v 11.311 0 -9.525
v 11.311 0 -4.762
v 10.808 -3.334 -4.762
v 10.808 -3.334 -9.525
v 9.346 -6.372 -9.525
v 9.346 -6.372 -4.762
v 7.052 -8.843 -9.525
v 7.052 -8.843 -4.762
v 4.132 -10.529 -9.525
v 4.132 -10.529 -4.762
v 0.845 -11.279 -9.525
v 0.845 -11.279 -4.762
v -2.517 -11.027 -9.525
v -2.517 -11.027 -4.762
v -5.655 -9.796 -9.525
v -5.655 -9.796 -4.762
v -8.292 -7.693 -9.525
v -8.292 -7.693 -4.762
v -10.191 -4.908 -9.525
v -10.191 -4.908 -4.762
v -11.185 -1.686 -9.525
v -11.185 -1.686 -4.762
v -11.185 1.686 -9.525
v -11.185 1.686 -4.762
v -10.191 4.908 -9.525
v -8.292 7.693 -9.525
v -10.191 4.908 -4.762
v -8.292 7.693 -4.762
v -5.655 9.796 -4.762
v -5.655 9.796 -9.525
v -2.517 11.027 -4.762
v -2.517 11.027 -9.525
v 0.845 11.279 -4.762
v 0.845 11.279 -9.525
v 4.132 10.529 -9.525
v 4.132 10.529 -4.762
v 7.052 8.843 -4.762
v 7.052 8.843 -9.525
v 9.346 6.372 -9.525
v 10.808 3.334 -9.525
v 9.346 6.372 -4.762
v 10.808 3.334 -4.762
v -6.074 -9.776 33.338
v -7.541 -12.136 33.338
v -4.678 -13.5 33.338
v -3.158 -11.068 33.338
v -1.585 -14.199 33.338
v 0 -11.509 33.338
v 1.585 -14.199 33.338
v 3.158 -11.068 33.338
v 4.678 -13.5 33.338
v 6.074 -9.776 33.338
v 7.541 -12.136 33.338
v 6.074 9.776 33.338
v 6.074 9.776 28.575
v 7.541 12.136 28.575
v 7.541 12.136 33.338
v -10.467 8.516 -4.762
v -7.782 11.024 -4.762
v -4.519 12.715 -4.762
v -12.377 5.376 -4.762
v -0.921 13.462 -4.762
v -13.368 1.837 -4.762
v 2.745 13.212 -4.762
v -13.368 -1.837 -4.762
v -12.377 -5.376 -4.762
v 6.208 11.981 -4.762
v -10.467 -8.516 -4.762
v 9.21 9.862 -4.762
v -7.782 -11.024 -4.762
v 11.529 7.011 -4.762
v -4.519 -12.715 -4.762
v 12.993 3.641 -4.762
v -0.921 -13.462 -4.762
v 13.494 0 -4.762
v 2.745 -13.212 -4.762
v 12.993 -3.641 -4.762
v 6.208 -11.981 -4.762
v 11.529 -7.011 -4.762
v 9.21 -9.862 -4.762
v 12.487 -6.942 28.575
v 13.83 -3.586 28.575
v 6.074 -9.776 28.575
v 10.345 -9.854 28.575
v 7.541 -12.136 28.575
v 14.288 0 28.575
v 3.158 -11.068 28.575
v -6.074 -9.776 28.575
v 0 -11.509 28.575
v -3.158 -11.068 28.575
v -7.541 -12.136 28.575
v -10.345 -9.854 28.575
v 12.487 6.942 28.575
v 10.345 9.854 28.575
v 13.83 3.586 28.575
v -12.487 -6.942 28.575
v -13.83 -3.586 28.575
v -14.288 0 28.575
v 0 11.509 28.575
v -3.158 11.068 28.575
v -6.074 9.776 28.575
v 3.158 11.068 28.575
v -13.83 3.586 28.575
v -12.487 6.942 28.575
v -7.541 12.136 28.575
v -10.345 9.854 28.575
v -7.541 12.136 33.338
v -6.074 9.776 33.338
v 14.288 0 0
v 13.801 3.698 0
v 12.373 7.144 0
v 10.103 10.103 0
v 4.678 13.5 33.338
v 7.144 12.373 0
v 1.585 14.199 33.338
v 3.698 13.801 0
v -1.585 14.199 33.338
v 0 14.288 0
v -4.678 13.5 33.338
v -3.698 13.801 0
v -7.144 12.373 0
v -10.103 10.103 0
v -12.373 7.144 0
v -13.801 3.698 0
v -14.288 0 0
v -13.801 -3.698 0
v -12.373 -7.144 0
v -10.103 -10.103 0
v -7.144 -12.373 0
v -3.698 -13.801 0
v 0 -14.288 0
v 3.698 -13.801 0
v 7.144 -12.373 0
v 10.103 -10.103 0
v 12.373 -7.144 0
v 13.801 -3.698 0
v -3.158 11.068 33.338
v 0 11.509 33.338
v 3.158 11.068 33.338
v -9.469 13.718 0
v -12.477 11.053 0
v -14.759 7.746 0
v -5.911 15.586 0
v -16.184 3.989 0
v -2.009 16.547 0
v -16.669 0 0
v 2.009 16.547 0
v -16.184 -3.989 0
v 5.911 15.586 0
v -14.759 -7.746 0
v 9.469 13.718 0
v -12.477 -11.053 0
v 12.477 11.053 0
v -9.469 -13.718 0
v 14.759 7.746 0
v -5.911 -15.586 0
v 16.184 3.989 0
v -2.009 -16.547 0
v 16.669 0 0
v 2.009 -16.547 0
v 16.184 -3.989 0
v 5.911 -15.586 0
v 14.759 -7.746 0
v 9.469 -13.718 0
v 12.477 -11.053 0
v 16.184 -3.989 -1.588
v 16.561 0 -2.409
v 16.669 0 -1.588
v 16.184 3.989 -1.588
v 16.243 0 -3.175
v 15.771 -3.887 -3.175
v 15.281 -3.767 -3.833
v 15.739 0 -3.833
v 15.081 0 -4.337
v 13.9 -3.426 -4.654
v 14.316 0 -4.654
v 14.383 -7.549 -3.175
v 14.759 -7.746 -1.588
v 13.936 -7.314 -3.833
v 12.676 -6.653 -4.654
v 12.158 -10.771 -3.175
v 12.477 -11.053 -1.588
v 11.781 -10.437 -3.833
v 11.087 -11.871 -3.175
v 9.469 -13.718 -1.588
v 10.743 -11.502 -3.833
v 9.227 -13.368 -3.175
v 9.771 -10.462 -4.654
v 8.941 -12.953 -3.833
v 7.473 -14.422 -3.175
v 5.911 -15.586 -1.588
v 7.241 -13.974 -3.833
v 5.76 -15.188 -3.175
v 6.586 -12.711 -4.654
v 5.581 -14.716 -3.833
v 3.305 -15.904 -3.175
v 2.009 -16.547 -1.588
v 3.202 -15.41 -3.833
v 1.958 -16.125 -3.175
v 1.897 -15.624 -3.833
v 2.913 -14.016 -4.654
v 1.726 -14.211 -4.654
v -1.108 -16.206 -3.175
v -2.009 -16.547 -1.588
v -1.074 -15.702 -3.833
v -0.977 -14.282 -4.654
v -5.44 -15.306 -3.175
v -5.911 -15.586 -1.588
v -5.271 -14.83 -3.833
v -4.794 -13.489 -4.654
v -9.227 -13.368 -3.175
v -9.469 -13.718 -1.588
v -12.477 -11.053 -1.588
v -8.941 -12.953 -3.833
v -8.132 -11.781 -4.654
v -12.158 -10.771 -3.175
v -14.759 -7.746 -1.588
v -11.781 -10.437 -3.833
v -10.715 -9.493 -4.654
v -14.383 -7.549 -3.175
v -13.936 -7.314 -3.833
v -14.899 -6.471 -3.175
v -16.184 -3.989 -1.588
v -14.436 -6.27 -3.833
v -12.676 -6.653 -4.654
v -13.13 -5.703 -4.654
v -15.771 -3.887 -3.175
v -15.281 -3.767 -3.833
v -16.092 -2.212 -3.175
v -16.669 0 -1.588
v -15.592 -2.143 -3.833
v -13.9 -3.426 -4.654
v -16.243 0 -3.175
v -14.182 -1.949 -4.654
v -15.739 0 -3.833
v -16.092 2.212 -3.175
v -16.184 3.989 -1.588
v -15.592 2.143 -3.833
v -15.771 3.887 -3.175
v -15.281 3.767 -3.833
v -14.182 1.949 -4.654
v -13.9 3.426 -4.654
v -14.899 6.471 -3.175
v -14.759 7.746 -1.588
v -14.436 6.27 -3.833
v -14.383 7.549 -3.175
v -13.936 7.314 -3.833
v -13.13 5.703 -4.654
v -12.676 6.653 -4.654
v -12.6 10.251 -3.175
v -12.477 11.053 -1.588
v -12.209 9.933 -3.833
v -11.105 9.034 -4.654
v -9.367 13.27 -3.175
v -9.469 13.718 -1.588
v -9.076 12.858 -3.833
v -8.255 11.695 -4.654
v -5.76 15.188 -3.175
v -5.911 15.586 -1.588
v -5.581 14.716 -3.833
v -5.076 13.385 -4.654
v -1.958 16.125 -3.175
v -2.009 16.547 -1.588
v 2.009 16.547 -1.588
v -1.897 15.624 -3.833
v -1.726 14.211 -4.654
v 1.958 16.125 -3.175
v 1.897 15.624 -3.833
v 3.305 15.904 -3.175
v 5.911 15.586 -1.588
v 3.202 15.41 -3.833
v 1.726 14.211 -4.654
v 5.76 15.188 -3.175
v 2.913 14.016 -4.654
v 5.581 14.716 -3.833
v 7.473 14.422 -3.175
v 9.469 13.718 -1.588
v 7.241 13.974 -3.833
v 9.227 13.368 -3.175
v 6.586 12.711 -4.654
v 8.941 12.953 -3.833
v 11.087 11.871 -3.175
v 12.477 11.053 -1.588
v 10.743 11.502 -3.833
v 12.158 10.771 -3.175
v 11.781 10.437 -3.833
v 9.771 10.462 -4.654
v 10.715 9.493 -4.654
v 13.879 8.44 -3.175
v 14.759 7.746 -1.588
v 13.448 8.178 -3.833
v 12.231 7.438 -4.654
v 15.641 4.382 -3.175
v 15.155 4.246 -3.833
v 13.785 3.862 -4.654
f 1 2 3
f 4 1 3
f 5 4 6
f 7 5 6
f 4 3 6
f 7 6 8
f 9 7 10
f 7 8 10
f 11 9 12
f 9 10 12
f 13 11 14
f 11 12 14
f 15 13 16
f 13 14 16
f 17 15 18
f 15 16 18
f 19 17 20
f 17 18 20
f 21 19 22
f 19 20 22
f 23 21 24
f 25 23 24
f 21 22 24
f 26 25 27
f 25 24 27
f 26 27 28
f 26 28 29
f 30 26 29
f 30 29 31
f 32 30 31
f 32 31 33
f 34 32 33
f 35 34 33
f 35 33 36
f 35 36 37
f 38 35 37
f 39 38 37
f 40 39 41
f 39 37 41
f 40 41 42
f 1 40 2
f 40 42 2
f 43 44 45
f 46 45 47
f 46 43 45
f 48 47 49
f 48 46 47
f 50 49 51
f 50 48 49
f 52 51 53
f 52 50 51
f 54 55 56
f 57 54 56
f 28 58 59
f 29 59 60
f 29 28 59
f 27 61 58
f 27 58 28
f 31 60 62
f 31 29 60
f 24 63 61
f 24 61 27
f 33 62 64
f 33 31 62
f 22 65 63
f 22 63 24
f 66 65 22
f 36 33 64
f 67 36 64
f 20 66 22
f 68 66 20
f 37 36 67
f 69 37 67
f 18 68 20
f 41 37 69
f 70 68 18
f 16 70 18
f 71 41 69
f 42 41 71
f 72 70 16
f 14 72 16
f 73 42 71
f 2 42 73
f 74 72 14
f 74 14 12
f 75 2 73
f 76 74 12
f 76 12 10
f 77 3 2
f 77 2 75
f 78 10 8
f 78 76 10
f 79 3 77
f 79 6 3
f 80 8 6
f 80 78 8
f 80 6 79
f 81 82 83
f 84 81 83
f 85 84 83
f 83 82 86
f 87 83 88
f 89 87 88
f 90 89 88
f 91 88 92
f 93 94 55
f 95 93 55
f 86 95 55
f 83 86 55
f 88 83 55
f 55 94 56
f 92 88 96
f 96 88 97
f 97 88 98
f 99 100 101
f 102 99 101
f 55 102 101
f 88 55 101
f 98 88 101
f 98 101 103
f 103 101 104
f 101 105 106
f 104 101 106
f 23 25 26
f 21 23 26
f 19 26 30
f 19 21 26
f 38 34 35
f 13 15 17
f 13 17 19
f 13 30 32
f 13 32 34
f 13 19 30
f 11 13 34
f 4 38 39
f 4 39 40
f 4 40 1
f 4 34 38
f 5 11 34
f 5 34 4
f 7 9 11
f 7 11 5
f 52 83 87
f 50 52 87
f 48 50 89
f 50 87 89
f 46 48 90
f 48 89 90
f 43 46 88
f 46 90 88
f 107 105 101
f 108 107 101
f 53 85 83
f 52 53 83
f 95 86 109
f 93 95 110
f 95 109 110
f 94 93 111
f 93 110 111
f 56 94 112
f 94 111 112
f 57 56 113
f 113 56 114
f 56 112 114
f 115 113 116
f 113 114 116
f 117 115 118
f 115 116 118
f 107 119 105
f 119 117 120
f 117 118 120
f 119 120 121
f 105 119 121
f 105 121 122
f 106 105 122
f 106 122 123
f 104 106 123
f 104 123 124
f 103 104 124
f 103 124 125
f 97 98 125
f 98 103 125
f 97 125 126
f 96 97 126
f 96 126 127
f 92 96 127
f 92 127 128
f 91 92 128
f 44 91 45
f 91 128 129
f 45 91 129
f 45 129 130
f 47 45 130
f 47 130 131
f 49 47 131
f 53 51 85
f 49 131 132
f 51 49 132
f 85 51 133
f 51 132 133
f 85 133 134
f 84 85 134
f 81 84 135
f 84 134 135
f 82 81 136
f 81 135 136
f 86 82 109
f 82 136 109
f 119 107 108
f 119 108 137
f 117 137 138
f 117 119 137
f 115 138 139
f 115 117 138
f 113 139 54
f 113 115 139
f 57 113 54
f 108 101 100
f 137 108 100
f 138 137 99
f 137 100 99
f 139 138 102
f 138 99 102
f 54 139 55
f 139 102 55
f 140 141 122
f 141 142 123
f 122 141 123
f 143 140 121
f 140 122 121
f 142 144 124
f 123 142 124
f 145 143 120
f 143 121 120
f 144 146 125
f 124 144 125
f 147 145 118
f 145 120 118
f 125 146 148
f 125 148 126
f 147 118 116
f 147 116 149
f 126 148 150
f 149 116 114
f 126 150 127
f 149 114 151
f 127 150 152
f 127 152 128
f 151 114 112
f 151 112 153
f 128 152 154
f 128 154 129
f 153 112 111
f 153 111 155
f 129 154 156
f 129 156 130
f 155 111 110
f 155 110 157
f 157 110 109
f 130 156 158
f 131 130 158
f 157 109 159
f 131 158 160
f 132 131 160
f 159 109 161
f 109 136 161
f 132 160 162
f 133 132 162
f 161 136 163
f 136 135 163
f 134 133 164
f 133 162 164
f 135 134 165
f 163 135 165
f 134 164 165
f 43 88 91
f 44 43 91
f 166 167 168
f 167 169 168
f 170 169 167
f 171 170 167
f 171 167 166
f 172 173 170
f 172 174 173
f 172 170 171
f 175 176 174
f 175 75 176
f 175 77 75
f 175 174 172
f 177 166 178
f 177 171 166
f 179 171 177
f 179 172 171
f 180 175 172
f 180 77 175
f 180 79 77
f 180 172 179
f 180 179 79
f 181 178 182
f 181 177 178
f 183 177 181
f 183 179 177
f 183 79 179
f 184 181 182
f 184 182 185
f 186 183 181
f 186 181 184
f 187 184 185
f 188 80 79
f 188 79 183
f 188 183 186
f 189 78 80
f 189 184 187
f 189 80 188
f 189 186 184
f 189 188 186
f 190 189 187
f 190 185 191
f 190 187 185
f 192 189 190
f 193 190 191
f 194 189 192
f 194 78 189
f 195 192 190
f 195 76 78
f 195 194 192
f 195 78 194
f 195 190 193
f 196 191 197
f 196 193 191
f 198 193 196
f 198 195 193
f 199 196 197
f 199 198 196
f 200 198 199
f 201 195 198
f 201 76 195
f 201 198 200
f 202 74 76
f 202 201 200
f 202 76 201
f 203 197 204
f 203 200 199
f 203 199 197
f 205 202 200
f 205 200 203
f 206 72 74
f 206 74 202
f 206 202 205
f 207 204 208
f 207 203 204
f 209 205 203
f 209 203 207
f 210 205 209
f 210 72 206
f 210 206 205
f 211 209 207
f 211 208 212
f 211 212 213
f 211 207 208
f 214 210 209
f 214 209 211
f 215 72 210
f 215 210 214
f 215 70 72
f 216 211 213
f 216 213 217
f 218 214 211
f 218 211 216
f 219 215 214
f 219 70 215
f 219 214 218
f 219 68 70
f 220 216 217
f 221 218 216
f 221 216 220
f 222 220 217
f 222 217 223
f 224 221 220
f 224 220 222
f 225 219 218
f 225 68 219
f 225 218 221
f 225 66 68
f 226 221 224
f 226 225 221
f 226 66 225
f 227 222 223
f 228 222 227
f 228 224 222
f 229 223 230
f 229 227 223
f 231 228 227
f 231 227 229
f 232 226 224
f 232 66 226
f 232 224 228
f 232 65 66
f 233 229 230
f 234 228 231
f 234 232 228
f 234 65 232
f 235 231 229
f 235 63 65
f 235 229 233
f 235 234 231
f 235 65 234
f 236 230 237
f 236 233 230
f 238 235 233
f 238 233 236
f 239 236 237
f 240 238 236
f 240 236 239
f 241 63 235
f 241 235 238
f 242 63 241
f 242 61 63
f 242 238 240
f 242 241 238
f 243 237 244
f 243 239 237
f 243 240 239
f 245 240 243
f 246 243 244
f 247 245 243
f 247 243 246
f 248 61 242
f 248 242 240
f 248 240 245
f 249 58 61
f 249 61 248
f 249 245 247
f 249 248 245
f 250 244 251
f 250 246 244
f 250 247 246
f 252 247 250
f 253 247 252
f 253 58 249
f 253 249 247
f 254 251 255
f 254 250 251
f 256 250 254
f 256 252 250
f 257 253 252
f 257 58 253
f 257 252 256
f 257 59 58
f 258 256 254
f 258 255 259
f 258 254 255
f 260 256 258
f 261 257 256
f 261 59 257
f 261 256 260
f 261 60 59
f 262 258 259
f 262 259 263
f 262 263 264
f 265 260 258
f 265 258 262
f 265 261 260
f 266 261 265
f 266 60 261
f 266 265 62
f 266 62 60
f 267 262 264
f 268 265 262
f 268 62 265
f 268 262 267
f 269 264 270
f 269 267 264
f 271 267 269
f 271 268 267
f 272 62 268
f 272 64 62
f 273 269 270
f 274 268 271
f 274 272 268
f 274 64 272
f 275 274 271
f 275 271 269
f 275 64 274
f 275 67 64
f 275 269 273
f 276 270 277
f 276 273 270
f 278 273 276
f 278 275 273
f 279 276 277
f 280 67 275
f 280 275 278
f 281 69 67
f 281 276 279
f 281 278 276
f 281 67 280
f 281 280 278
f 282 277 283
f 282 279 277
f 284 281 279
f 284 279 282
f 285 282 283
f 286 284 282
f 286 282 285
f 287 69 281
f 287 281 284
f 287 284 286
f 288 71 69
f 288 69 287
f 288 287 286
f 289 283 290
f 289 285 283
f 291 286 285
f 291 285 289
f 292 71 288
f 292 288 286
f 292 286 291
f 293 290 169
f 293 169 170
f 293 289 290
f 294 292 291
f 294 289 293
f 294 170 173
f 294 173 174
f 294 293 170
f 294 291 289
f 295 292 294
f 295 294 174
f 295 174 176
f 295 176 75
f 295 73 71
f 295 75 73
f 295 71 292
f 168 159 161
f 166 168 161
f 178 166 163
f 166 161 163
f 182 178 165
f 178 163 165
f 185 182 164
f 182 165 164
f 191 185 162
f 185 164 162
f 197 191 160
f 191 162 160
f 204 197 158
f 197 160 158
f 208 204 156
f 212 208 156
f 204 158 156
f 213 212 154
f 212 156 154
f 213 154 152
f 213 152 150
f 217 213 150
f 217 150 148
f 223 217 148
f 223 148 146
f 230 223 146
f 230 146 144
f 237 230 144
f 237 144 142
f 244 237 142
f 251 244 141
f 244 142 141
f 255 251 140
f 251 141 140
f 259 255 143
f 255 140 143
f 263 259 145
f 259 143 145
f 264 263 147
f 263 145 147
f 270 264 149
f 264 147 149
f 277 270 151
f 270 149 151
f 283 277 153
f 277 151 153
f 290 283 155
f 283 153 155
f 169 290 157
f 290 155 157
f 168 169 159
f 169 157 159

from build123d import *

# Parameters (mm, degrees)
SKETCH1_R           = 14.2875
BOSS_EXTRUDE1_DEPTH = 33.3375
SKETCH2_R           = 16.66875
BOSS_EXTRUDE2_DEPTH = 4.7625
FILLET1_R           = 3.175
SKETCH3_R           = 11.3109375
BOSS_EXTRUDE3_DEPTH = 4.7625
CUT_EXTRUDE1_START  = -4.7625
CUT_EXTRUDE1_DEPTH  = 4.7625


with BuildPart() as part:
    # Sketch1 → Boss-Extrude1 (new body)
    with BuildSketch(Plane.XY):
        Circle(SKETCH1_R)
    extrude(amount=BOSS_EXTRUDE1_DEPTH)

    # Sketch2 → Boss-Extrude2 (add)
    with BuildSketch(Plane(origin=(0, 0, 0), x_dir=(-1, 0, 0), z_dir=(0, 0, -1))):
        with Locations(Location((0, 0, 0), (0, 0, 180))):
            Circle(SKETCH2_R)
    extrude(amount=BOSS_EXTRUDE2_DEPTH)

    # Fillet1
    fillet1_edges = [part.edges().sort_by_distance(p)[0] for p in [
        (-16.66875, 0, -4.7625),
    ]]
    fillet(fillet1_edges, radius=FILLET1_R)

    # Sketch3 → Boss-Extrude3 (add)
    with BuildSketch(Plane(origin=(0, 0, -4.7625), x_dir=(-1, 0, 0), z_dir=(0, 0, -1))):
        with Locations(Location((0, 0, 0), (0, 0, 180))):
            Circle(SKETCH3_R)
    extrude(amount=BOSS_EXTRUDE3_DEPTH)

    # Sketch4 → Cut-Extrude1 (cut)
    with BuildSketch(Plane.XY.offset(33.3375).offset(CUT_EXTRUDE1_START)):
        with BuildLine():
            Line((-7.540625, 12.135552351), (-6.074392361, 9.775861616))
            ThreePointArc((-6.074392361, 9.775861616), (0, 11.509375), (6.074392361, 9.775861616))
            Line((6.074392361, 9.775861616), (7.540625, 12.135552351))
            ThreePointArc((7.540625, 12.135552351), (14.2875, 0), (7.540625, -12.135552351))
            Line((7.540625, -12.135552351), (6.074392361, -9.775861616))
            ThreePointArc((6.074392361, -9.775861616), (0, -11.509375), (-6.074392361, -9.775861616))
            Line((-6.074392361, -9.775861616), (-7.540625, -12.135552351))
            ThreePointArc((-7.540625, -12.135552351), (-14.2875, 0), (-7.540625, 12.135552351))
        make_face()
    extrude(amount=CUT_EXTRUDE1_DEPTH, mode=Mode.SUBTRACT)


solid = part.part
